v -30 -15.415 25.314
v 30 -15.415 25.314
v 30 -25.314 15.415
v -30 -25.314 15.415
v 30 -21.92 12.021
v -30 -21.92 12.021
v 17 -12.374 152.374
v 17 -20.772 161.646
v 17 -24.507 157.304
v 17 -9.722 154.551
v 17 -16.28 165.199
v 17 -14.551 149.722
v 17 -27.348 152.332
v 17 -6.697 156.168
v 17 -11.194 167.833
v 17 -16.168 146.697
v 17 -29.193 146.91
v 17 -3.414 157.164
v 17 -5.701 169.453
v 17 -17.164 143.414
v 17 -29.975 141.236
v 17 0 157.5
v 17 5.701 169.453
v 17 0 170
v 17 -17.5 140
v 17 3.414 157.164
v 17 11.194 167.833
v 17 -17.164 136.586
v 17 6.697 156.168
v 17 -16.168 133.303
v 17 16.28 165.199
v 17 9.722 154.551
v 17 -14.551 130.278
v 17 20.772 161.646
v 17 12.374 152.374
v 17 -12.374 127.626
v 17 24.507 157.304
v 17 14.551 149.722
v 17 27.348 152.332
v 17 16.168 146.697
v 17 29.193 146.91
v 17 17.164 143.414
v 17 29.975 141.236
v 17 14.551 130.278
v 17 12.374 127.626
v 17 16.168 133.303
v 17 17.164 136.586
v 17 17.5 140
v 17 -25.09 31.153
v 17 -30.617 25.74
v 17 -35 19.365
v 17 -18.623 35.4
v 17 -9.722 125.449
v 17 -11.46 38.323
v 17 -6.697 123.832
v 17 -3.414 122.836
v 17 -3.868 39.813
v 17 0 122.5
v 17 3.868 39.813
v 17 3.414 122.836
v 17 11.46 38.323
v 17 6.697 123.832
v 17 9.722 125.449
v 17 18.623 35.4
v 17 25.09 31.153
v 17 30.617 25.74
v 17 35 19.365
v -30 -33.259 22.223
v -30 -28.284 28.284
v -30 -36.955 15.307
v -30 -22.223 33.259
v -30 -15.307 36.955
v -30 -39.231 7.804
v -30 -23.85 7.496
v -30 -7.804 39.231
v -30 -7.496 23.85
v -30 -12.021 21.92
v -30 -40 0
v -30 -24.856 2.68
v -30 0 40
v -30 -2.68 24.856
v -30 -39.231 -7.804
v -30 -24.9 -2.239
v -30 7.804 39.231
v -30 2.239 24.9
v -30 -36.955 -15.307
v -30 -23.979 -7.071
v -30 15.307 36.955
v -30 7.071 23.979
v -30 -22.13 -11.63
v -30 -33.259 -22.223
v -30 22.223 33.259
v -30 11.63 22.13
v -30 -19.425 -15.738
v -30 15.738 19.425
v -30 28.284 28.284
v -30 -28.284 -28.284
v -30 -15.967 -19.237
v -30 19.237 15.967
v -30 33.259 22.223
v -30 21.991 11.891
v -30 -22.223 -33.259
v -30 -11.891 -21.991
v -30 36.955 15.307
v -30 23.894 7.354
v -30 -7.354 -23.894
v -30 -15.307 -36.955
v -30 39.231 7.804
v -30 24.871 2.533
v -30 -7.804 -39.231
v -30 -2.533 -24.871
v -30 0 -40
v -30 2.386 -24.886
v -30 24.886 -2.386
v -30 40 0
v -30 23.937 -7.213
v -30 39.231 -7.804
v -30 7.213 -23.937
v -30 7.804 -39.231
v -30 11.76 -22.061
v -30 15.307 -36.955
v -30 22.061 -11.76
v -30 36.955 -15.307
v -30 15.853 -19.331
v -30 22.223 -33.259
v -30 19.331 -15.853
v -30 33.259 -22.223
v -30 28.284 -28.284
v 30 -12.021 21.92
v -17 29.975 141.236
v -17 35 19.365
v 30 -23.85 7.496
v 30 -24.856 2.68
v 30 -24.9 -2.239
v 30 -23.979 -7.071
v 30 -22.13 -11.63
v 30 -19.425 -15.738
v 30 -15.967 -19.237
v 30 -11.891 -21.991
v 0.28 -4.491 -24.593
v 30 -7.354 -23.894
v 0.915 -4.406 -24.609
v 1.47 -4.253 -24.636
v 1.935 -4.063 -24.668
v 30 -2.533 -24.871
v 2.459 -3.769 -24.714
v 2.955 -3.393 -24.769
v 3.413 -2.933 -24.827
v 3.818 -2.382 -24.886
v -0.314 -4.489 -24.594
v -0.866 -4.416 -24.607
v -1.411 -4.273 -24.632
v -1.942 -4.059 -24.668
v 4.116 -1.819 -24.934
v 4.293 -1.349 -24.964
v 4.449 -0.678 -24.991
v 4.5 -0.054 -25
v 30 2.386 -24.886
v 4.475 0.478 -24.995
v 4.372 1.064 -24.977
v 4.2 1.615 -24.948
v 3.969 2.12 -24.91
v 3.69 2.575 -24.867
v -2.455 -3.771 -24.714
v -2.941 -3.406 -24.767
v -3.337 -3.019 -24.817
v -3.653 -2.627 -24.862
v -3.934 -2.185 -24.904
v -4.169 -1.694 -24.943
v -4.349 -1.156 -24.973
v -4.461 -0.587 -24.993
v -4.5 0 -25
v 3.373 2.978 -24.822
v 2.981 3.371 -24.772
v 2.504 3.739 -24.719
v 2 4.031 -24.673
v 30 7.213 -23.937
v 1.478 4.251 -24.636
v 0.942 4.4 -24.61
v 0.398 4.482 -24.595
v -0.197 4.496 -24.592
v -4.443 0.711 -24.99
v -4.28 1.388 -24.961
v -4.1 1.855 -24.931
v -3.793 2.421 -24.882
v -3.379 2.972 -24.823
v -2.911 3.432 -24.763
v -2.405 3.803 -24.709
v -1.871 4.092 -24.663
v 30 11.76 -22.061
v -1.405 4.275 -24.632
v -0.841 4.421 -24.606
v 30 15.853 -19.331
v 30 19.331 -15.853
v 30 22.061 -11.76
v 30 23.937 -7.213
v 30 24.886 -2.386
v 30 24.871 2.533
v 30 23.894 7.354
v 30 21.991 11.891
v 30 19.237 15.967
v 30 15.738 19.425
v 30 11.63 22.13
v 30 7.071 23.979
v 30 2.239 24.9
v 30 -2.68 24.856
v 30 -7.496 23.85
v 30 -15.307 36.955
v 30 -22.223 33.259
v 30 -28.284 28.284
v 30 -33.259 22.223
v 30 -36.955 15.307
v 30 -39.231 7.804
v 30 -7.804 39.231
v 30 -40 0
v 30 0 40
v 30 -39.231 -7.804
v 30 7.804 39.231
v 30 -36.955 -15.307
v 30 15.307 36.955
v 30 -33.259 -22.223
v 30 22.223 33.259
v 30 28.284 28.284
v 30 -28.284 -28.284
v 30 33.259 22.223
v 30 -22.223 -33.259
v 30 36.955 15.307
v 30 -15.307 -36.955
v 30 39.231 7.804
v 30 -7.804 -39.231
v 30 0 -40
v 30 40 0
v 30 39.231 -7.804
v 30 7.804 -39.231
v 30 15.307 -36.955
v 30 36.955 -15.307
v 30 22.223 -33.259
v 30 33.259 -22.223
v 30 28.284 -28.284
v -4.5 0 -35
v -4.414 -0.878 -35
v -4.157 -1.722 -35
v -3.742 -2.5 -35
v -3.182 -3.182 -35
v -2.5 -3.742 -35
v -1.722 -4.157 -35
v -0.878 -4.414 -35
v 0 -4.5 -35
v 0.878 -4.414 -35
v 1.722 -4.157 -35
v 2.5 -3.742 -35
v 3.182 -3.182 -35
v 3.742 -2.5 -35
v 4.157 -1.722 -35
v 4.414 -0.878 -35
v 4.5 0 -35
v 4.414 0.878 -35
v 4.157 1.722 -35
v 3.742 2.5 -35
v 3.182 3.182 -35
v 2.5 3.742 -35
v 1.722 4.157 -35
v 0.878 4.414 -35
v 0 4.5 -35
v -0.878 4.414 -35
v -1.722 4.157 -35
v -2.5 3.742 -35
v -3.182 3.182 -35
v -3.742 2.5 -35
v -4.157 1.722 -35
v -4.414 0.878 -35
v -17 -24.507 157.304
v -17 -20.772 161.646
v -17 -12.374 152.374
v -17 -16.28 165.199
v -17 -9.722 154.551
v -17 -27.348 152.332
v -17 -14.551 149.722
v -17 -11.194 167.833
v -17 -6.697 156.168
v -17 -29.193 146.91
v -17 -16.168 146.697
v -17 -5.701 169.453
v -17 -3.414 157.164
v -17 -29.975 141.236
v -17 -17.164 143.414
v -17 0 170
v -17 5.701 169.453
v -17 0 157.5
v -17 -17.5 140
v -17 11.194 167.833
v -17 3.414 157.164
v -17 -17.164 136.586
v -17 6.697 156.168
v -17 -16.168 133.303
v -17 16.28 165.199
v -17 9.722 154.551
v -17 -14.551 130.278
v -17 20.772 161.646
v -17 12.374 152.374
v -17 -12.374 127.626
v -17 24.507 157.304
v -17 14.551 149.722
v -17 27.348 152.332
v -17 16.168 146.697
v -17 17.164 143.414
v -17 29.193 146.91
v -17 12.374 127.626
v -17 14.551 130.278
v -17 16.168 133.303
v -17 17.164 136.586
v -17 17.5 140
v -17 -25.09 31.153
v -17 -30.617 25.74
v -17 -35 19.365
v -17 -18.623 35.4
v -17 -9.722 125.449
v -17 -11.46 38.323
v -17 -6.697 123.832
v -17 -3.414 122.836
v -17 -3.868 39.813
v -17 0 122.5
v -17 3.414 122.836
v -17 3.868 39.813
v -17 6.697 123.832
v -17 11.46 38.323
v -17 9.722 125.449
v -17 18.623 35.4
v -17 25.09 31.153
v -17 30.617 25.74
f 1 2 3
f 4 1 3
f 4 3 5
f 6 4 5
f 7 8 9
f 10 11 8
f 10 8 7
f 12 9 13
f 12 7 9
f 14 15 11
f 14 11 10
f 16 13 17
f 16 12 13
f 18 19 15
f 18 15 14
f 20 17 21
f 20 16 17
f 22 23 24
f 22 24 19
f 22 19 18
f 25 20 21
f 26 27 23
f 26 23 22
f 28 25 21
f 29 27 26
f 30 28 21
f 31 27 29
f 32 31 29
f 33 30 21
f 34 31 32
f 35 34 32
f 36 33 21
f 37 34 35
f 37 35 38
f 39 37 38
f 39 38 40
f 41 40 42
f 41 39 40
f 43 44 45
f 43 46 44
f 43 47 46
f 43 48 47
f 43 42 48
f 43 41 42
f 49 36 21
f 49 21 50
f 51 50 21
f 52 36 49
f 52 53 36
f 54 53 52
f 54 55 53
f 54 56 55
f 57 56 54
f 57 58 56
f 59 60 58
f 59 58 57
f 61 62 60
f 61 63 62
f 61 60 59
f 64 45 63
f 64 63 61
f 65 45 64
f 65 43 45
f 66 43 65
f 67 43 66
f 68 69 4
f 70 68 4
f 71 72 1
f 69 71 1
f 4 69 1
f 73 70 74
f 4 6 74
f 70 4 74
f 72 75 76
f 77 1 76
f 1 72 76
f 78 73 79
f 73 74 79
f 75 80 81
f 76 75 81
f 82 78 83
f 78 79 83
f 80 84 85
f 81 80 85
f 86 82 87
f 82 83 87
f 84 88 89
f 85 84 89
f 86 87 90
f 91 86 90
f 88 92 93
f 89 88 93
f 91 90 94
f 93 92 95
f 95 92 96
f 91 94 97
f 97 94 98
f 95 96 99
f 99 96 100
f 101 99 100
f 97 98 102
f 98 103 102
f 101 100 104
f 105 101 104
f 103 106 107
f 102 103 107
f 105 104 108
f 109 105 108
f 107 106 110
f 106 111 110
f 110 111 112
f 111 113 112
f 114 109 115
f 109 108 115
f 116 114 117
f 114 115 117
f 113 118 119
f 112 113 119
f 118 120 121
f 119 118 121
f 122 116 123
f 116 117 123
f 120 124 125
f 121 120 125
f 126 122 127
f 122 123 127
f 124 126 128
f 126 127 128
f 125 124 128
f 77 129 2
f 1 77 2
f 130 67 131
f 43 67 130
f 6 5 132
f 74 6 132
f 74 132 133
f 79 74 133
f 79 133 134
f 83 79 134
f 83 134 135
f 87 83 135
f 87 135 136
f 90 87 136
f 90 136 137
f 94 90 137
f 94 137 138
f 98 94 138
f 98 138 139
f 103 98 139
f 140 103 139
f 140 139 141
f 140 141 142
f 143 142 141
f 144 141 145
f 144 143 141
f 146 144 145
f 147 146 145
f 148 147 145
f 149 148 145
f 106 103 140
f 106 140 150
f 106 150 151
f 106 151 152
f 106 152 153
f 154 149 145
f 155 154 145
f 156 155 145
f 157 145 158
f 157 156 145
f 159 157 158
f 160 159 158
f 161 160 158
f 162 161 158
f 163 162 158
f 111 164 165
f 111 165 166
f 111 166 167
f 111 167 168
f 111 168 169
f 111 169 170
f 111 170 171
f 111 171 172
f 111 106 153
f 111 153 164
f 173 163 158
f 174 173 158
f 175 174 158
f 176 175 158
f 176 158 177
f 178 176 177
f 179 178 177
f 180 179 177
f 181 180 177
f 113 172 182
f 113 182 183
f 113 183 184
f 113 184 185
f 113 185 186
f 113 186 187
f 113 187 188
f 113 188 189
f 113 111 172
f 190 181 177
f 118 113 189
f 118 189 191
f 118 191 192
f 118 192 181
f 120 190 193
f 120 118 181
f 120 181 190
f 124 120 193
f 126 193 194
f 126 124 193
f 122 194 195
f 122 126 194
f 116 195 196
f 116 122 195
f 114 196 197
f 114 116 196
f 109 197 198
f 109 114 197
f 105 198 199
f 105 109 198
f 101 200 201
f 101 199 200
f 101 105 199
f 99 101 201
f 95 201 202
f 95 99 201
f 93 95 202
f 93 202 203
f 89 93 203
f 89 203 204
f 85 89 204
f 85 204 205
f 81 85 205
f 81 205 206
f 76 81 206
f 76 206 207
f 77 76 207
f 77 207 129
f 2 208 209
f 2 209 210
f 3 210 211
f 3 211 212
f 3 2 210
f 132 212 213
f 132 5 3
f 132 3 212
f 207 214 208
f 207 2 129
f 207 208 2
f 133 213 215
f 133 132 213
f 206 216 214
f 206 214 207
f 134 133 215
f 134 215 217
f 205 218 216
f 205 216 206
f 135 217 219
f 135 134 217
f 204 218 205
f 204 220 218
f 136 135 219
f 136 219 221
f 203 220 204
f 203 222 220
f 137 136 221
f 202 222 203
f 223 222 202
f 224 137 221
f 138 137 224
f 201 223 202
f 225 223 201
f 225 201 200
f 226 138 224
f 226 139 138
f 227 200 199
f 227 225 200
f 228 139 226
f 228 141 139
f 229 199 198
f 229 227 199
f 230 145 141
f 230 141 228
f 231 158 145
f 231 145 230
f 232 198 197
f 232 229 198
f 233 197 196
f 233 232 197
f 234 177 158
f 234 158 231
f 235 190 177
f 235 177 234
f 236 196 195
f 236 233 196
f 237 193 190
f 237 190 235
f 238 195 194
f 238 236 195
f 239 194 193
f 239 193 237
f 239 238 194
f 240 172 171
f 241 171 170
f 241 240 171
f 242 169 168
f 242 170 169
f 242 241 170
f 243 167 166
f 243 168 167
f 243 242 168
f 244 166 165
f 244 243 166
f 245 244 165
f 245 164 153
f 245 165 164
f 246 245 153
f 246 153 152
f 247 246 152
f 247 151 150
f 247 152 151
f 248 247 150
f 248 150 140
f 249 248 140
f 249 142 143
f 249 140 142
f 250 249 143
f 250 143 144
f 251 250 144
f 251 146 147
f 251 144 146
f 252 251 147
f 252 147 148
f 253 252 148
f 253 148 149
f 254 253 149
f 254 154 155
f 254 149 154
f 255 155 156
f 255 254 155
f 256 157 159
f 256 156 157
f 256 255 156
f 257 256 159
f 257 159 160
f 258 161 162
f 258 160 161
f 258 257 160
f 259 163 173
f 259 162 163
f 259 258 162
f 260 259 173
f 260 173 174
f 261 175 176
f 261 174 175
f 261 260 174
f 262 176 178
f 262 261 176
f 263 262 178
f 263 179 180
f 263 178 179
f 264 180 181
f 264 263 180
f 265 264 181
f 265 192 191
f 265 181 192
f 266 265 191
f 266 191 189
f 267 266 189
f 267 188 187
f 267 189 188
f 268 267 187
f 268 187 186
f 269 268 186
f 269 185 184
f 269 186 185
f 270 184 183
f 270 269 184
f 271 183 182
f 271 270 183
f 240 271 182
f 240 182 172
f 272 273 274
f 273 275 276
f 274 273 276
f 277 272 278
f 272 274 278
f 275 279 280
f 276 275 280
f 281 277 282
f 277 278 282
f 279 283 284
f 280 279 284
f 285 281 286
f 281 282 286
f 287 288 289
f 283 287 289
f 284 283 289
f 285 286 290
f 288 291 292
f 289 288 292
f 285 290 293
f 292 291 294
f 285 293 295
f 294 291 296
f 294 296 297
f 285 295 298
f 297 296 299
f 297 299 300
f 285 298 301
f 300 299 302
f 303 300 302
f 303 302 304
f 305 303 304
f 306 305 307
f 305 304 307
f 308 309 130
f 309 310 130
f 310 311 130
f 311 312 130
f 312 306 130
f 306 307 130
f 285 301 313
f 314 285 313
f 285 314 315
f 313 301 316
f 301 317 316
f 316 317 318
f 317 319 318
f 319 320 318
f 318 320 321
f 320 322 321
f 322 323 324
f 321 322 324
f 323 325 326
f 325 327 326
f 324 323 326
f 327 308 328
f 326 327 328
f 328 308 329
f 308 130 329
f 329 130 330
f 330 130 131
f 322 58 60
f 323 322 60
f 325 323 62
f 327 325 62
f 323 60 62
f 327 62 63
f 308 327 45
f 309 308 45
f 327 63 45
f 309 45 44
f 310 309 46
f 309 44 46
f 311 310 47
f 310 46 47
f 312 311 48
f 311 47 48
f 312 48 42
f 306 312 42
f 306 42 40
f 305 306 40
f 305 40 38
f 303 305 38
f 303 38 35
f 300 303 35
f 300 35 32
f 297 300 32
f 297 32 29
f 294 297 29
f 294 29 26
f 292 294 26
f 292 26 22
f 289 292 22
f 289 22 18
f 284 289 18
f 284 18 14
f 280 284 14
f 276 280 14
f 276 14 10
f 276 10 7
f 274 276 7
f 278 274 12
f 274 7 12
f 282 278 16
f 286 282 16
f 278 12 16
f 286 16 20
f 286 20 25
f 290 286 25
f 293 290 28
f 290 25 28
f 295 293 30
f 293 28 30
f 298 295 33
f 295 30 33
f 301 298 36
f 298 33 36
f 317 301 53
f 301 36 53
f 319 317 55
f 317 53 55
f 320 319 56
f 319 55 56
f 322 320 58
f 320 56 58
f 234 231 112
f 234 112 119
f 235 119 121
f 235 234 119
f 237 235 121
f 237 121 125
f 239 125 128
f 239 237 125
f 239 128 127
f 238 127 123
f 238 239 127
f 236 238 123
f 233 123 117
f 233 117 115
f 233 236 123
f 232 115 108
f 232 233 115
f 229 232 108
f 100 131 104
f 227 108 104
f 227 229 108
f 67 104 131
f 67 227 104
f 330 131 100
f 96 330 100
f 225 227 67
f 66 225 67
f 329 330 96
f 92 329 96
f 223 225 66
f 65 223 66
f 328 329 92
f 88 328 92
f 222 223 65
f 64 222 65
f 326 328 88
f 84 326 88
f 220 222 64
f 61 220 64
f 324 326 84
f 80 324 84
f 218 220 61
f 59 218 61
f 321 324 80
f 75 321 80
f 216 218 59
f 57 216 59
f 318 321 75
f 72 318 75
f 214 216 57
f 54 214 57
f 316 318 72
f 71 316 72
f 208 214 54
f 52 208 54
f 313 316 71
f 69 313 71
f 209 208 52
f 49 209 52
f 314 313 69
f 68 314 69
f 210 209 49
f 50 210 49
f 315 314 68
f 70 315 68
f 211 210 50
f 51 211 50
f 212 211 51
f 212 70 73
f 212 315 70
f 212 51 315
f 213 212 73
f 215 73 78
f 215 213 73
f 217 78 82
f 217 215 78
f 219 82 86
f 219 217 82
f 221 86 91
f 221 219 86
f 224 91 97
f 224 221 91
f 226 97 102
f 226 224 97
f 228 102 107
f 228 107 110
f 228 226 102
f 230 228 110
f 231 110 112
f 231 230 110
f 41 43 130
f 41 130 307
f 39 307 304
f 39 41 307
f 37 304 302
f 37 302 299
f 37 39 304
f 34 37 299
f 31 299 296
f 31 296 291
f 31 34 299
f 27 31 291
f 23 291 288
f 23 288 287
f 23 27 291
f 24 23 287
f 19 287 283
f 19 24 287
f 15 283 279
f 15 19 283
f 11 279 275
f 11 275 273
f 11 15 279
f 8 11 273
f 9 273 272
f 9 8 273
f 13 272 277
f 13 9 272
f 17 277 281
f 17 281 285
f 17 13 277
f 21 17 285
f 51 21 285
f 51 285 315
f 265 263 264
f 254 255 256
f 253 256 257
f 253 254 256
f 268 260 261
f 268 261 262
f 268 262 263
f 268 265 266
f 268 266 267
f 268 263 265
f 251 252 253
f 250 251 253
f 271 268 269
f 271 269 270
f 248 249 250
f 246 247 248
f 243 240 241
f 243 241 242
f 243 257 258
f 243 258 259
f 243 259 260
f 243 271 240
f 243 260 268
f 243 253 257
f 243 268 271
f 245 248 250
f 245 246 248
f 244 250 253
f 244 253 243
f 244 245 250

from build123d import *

# Parameters (mm, degrees)
SKETCH1_R           = 40
SKETCH1_R_2         = 25
BOSS_EXTRUDE1_DEPTH = 30
BOSS_EXTRUDE2_DEPTH = 17
SKETCH3_R           = 17.5
CUT_EXTRUDE1_DEPTH  = 181.856296545
CUT_EXTRUDE2_DEPTH  = 185.661853126
SKETCH6_R           = 4.5
CUT_EXTRUDE3_DEPTH  = 24


with BuildPart() as part:
    # Sketch1 → Boss-Extrude1 (new, symmetric)
    with BuildSketch(Plane(origin=(0, 0, 0), x_dir=(0, 0, -1), z_dir=(1, 0, 0))):
        Circle(SKETCH1_R)
        Circle(SKETCH1_R_2, mode=Mode.SUBTRACT)
    extrude(amount=BOSS_EXTRUDE1_DEPTH, both=True)

    # Sketch2 → Boss-Extrude2 (add, symmetric)
    with BuildSketch(Plane(origin=(0, 0, 0), x_dir=(0, 0, -1), z_dir=(1, 0, 0))):
        with BuildLine():
            Line((-19.364916731, 35), (-141.236028691, 29.974526403))
            ThreePointArc((-141.236028691, 29.974526403), (-170, 0), (-141.236028691, -29.974526403))
            Line((-141.236028691, -29.974526403), (-19.364916731, -35))
            ThreePointArc((-19.364916731, -35), (-40, 0), (-19.364916731, 35))
        make_face()
    extrude(amount=BOSS_EXTRUDE2_DEPTH, both=True)

    # Sketch3 → Cut-Extrude1 (cut, through all)
    with BuildSketch(Plane(origin=(17, 0, 0), x_dir=(0, 0, -1), z_dir=(1, 0, 0))):
        with Locations((-140, 0)):
            Circle(SKETCH3_R)
    extrude(amount=-CUT_EXTRUDE1_DEPTH, mode=Mode.SUBTRACT)

    # Sketch5 → Cut-Extrude2 (cut, through all)
    with BuildSketch(Plane(origin=(30, 0, 0), x_dir=(0, 0, -1), z_dir=(1, 0, 0))):
        Polygon((-3.702856162, 6.196638775), (-25.314422766, -15.41492783), (-15.41492783, -25.314422766), (6.196638775, -3.702856162), align=None)
    extrude(amount=-CUT_EXTRUDE2_DEPTH, mode=Mode.SUBTRACT)

    # Sketch6 → Cut-Extrude3 (cut)
    with BuildSketch(Plane.XY.offset(-35)):
        with Locations(Location((0, 0, 0), (0, 0, 180))):
            Circle(SKETCH6_R)
    extrude(amount=CUT_EXTRUDE3_DEPTH, mode=Mode.SUBTRACT)


solid = part.part
